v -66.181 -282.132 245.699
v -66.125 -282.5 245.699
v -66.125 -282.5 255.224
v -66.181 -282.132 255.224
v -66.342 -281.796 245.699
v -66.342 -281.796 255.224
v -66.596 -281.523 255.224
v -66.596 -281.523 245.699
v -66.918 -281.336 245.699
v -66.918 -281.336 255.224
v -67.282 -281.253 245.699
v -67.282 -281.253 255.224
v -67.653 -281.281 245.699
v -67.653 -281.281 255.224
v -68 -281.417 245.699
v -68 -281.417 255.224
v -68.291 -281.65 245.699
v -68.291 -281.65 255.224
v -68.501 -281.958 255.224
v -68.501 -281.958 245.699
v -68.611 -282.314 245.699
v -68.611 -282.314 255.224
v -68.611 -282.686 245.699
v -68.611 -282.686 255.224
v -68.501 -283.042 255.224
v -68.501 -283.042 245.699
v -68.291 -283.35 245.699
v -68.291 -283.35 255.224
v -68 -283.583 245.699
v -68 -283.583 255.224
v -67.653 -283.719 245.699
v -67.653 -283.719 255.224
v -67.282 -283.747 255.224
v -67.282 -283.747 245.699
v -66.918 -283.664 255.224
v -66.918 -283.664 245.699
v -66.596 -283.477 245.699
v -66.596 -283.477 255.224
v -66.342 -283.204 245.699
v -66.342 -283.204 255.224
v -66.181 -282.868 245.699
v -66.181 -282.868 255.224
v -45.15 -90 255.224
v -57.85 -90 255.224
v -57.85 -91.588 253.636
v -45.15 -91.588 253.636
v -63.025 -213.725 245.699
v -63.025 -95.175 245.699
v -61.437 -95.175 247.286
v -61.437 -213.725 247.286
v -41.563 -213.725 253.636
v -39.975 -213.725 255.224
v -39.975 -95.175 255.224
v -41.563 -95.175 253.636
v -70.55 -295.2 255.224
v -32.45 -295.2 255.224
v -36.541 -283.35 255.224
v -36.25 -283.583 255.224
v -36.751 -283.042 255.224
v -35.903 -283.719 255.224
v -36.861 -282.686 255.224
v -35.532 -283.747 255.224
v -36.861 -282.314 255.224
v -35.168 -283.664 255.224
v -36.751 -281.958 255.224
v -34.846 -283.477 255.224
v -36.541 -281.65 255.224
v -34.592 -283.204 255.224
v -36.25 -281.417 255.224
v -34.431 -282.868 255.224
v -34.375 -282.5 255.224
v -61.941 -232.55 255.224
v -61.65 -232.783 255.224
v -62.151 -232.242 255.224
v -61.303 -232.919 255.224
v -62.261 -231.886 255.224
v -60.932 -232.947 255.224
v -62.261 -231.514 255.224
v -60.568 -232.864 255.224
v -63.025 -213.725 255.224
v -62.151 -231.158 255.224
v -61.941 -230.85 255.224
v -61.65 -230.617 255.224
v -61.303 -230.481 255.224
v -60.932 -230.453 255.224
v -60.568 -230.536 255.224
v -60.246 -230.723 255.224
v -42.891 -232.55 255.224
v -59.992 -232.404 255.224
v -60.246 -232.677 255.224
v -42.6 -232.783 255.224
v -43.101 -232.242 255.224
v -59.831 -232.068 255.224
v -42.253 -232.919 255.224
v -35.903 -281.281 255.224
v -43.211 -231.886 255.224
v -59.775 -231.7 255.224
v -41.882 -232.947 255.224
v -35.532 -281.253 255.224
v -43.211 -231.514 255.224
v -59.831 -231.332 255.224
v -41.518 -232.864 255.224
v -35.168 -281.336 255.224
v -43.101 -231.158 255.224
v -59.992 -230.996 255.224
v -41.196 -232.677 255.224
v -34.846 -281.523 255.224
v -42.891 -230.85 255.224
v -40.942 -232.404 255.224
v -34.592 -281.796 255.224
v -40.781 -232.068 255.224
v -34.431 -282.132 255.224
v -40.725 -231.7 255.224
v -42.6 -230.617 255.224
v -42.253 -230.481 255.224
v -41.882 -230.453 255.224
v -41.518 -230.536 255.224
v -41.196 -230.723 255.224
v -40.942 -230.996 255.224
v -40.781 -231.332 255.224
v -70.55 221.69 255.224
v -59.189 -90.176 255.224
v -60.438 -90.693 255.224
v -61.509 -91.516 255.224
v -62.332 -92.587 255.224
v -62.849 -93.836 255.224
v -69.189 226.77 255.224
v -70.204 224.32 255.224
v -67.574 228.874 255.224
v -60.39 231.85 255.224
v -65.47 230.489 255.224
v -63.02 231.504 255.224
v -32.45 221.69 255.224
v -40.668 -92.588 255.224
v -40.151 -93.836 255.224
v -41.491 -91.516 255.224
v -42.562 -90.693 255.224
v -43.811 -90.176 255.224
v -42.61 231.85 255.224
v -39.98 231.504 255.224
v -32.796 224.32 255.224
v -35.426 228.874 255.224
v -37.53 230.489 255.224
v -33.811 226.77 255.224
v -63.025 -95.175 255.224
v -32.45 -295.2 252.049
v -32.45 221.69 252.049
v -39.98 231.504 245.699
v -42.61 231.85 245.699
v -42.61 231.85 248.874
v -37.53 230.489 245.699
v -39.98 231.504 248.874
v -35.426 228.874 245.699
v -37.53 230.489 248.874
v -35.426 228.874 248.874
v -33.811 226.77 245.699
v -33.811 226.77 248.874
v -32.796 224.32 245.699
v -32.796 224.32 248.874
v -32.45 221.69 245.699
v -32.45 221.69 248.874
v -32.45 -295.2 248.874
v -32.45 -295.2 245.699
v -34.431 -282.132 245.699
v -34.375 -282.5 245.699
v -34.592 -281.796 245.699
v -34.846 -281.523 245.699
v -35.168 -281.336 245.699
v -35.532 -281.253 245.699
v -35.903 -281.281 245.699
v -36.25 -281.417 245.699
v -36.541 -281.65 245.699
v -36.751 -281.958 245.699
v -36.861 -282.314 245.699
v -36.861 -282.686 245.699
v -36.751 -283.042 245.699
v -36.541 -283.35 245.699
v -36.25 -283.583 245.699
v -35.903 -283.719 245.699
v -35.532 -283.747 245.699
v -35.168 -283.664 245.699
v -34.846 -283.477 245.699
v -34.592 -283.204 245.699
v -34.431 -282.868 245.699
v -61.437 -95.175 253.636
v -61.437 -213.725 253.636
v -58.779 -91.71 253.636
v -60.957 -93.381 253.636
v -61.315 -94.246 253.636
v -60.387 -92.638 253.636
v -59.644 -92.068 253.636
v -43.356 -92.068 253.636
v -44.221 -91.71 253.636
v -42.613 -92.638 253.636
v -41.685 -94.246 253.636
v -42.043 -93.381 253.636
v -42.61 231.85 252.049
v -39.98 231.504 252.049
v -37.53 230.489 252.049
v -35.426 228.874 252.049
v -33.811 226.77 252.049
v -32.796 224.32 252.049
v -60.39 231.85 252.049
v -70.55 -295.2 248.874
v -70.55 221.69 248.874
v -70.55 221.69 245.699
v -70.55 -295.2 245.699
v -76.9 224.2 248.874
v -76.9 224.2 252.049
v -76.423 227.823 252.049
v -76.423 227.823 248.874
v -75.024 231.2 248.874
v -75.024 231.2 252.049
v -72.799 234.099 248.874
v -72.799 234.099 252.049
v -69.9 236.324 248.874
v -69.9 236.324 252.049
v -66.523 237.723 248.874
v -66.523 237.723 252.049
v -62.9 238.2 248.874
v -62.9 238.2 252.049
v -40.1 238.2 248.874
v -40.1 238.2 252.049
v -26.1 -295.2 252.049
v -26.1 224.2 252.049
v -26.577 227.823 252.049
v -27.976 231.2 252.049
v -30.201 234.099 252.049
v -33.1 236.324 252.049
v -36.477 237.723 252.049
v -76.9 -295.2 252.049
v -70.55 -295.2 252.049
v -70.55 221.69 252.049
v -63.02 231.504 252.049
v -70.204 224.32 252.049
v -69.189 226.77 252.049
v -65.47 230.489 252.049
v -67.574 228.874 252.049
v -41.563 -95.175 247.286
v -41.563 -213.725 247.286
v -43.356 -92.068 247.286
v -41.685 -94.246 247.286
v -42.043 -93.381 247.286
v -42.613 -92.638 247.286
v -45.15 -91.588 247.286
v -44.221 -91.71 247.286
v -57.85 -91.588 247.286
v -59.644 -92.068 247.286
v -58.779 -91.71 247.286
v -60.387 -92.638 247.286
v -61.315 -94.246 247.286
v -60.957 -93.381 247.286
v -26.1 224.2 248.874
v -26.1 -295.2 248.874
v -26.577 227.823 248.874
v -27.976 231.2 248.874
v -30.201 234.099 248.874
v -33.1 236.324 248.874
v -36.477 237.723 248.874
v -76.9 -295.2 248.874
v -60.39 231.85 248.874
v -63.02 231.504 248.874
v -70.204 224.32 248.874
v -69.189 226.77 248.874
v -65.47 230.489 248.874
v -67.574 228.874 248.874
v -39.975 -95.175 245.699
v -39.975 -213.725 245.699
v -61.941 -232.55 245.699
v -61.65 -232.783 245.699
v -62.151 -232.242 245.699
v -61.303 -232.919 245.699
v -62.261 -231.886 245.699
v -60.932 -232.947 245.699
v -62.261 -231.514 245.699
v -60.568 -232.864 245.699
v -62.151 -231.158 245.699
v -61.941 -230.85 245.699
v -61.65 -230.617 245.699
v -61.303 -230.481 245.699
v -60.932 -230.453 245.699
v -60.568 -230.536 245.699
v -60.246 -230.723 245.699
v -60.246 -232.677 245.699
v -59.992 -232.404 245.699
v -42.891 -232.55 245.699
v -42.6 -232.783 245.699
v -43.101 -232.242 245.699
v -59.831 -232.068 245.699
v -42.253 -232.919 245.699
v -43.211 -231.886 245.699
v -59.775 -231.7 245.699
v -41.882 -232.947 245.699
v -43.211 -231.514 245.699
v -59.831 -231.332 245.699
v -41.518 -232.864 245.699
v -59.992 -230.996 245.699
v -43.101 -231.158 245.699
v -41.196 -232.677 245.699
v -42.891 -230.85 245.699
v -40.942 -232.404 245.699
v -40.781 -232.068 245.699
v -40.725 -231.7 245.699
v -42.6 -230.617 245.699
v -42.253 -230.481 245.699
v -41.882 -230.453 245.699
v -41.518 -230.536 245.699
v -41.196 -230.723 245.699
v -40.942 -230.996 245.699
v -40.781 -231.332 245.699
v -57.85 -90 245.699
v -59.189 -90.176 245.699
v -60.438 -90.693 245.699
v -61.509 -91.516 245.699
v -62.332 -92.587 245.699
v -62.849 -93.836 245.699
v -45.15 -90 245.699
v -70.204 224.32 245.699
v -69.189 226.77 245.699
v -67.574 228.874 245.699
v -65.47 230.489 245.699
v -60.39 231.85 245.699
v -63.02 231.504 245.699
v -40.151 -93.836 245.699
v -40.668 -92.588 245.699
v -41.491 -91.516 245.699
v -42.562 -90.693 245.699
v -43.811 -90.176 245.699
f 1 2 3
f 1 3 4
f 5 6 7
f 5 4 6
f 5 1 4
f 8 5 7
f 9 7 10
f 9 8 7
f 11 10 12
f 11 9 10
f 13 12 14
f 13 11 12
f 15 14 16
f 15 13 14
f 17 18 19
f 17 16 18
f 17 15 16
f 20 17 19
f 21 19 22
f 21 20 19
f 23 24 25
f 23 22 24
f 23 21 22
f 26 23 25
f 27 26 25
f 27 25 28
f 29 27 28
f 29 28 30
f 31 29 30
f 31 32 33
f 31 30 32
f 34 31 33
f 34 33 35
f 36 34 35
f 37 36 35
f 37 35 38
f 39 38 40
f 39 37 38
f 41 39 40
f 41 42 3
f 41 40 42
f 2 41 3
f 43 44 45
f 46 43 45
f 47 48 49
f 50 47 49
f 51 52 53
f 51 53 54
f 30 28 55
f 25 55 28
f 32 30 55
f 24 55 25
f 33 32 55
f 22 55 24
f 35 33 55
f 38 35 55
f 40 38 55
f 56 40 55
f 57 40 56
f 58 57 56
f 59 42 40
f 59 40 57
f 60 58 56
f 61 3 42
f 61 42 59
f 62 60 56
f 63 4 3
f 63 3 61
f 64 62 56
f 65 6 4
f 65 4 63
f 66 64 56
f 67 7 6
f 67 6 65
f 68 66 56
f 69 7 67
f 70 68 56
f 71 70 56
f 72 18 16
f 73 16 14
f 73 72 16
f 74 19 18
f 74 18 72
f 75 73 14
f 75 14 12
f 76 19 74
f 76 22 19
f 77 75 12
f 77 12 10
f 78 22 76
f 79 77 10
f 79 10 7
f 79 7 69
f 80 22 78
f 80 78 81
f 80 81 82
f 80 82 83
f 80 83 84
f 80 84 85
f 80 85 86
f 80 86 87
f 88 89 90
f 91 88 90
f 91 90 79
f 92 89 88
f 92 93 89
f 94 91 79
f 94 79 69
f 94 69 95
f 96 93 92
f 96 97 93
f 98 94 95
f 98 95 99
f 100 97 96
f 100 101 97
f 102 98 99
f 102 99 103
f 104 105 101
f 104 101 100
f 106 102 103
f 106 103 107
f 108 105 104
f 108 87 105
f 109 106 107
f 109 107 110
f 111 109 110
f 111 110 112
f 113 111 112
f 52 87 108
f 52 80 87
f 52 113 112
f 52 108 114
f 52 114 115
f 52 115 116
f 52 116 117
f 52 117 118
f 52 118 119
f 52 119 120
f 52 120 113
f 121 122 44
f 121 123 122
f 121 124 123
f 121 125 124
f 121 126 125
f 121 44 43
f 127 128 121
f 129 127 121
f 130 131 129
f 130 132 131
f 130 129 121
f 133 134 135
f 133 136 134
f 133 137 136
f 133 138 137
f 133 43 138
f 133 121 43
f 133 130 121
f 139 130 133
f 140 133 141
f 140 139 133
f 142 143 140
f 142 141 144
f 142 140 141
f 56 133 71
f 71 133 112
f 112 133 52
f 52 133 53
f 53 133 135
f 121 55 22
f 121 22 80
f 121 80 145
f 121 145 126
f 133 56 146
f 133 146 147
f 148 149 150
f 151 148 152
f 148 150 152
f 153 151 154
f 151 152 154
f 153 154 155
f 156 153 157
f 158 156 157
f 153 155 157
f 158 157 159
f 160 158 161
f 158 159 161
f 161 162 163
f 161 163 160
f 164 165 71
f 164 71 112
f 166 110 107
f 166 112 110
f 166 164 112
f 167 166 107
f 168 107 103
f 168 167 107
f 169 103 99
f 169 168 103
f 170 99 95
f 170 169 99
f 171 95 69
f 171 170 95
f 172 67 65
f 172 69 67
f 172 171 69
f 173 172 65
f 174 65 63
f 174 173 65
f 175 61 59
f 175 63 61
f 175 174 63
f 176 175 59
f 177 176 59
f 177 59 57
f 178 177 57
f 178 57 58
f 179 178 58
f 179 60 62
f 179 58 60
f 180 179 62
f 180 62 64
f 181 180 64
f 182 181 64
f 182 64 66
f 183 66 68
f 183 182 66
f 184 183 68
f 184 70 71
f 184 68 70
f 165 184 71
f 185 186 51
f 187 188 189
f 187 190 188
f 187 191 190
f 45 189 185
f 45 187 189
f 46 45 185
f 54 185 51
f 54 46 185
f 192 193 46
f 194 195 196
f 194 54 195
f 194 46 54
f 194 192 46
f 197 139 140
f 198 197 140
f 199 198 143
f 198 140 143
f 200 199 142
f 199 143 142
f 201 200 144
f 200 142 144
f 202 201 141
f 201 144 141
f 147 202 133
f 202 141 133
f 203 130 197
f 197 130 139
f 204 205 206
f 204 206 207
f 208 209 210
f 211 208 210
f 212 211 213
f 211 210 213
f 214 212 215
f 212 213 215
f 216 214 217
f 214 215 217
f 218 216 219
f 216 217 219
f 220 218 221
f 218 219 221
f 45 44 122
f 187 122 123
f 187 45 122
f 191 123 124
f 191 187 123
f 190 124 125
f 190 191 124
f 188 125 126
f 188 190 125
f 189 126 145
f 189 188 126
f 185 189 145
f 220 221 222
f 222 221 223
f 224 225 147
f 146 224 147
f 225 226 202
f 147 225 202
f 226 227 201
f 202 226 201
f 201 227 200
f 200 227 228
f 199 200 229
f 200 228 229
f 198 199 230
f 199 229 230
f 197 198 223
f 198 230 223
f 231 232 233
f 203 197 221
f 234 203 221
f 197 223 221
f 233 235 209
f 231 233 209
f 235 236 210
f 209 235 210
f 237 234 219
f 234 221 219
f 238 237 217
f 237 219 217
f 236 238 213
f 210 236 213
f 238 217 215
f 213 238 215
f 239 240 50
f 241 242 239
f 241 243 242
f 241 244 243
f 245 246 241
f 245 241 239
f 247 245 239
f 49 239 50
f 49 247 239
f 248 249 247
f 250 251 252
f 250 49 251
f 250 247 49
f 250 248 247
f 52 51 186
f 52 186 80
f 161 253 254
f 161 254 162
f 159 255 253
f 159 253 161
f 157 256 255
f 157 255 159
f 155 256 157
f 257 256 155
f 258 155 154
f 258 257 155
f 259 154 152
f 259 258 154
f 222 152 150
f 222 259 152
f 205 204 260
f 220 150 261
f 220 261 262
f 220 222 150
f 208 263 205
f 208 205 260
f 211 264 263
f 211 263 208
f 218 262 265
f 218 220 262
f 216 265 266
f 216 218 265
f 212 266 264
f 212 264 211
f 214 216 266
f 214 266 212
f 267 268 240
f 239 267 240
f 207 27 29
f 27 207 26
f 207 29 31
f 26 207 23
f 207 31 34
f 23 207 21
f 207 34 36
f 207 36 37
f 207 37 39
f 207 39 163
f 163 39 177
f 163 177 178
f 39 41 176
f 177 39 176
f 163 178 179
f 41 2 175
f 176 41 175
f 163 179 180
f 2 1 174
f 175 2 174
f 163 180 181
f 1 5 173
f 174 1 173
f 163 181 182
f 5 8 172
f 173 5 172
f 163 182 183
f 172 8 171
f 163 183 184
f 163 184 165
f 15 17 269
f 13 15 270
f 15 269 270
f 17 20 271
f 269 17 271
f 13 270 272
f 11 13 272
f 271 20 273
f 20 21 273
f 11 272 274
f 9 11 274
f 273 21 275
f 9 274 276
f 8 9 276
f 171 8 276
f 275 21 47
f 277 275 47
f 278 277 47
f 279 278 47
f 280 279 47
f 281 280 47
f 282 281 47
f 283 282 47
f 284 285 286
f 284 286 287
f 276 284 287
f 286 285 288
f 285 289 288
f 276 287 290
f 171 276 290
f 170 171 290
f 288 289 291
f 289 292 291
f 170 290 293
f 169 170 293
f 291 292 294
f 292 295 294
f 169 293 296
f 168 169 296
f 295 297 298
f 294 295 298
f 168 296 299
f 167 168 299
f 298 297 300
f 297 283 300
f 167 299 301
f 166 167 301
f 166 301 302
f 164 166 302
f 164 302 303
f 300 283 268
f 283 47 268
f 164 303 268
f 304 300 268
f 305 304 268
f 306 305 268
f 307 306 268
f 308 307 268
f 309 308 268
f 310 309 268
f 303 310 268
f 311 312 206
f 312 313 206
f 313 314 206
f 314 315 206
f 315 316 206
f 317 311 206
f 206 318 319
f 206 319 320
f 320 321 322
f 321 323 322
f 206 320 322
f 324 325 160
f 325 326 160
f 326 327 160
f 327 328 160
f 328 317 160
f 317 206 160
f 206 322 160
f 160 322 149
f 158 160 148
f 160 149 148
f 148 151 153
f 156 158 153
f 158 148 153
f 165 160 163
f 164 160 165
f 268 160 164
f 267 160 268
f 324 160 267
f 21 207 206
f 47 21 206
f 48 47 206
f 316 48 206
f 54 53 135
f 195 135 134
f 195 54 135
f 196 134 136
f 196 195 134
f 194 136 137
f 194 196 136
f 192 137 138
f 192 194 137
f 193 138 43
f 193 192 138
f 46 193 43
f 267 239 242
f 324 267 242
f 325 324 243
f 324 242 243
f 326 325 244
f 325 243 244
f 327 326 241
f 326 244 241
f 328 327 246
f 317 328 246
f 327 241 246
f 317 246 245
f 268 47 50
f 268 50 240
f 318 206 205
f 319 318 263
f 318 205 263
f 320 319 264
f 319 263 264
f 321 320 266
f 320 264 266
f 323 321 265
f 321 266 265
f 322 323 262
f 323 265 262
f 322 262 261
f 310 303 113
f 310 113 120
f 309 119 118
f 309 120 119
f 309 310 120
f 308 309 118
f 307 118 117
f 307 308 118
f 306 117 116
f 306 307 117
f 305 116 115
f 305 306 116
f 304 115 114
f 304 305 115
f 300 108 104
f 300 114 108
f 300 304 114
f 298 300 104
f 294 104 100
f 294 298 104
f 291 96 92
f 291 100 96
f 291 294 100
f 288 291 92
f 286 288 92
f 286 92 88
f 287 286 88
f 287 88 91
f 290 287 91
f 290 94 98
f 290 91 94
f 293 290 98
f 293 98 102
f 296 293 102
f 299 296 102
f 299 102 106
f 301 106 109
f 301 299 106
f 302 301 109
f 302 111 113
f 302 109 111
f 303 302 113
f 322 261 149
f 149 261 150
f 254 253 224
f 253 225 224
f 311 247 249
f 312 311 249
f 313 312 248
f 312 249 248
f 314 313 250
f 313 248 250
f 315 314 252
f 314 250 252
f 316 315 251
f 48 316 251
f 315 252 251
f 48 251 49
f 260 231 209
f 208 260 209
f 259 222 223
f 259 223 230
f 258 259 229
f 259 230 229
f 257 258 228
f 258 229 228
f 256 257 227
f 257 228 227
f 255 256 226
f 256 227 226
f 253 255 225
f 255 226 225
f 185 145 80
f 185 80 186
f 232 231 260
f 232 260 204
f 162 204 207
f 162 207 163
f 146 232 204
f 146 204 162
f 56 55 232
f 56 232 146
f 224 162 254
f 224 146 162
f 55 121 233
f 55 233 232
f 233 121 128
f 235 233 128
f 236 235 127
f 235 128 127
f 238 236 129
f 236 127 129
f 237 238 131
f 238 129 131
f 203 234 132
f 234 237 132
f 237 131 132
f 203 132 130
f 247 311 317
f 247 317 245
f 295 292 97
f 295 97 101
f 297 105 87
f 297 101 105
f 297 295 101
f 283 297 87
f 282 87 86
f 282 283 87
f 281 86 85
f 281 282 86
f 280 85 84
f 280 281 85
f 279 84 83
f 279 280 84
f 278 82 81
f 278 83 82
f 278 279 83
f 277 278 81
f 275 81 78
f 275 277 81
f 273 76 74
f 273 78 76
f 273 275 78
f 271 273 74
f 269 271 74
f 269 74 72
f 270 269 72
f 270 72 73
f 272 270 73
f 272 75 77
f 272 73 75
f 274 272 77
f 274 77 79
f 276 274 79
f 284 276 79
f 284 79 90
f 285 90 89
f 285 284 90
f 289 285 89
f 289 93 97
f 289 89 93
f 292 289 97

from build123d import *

# Parameters (mm, degrees)
BOSS_EXTRUDE2_DEPTH     = 1.5875
SKETCH2_W               = 38.1
SKETCH2_H               = 76.2
BOSS_EXTRUDE3_DEPTH     = 4.7625
CUT_EXTRUDE1_DEPTH      = 1.5875
CHAMFER1_SIZE           = 2
CUT_EXTRUDE2_DEPTH      = 306.117964892
CUT_EXTRUDE2_DEPTH_BACK = 306.117964892
SKETCH4_R               = 1.25


with BuildPart() as part:
    # Sketch1 → Boss-Extrude2 (new, symmetric)
    with BuildSketch(Plane.XY.offset(250.46101)):
        with BuildLine():
            Line((-62.9, 238.2), (-40.1, 238.2))
            ThreePointArc((-40.1, 238.2), (-30.200505063, 234.099494937), (-26.1, 224.2))
            Line((-26.1, 224.2), (-26.1, -219))
            Line((-26.1, -219), (-26.1, -295.2))
            Line((-26.1, -295.2), (-76.9, -295.2))
            Line((-76.9, -295.2), (-76.9, -219))
            Line((-76.9, -219), (-76.9, 224.2))
            ThreePointArc((-76.9, 224.2), (-72.799494937, 234.099494937), (-62.9, 238.2))
        make_face()
    extrude(amount=BOSS_EXTRUDE2_DEPTH, both=True)

    # Sketch2 → Boss-Extrude3 (add, symmetric)
    with BuildSketch(Plane.XY.offset(250.46101)):
        with Locations((-51.5, -257.1)):
            Rectangle(SKETCH2_W, SKETCH2_H)
        with BuildLine():
            Line((-60.39, 231.85), (-42.61, 231.85))
            ThreePointArc((-42.61, 231.85), (-35.425795103, 228.874204897), (-32.45, 221.69))
            Line((-32.45, 221.69), (-32.45, -219))
            Line((-32.45, -219), (-70.55, -219))
            Line((-70.55, -219), (-70.55, 221.69))
            ThreePointArc((-70.55, 221.69), (-67.574204897, 228.874204897), (-60.39, 231.85))
        make_face()
    extrude(amount=BOSS_EXTRUDE3_DEPTH, both=True)

    # Sketch3 → Cut-Extrude1 (cut)
    with BuildSketch(Plane.XY.offset(255.22351)):
        with BuildLine():
            Line((-61.025, -95.175), (-61.025, -213.725))
            Line((-61.025, -213.725), (-41.975, -213.725))
            Line((-41.975, -213.725), (-41.975, -95.175))
            ThreePointArc((-41.975, -95.175), (-42.90493597, -92.92993597), (-45.15, -92))
            Line((-45.15, -92), (-57.85, -92))
            ThreePointArc((-57.85, -92), (-60.09506403, -92.92993597), (-61.025, -95.175))
        make_face()
    cut_extrude1 = extrude(amount=-CUT_EXTRUDE1_DEPTH, mode=Mode.SUBTRACT)

    # Mirror2: Cut-Extrude1 across plane
    add(cut_extrude1.mirror(Plane.XY.offset(250.46101)), mode=Mode.SUBTRACT)

    # Chamfer1
    # the kernel refuses this chamfer: 2 mm, written as the material it takes off along each edge
    with BuildSketch(Plane(origin=(-41.975, -213.725, 255.22351), x_dir=(0.999621916911297, 0, 0.0274958766105822), z_dir=(0, 1, 0))) as chamfer1_piece_1_section:
        Polygon((CHAMFER1_SIZE * 0.999621916911, CHAMFER1_SIZE * 0.0274958766106), (-CHAMFER1_SIZE * 0.0274958766106, CHAMFER1_SIZE * 0.999621916911), (0, 0), align=None)
    chamfer1_piece_1 = extrude(amount=118.55, mode=Mode.PRIVATE)
    chamfer1_piece_1 = split(chamfer1_piece_1, bisect_by=Plane(origin=(-41.282092609, -154.45, 253.63601), z_dir=(0, 0, 1)), keep=Keep.TOP, mode=Mode.PRIVATE)
    add(chamfer1_piece_1, mode=Mode.SUBTRACT)
    with BuildSketch(Plane(origin=(-61.025, -95.175, 255.22351), x_dir=(-0.999621916911297, 0, 0.0274958766105822), z_dir=(0, -1, 0))) as chamfer1_piece_2_section:
        Polygon((CHAMFER1_SIZE * 0.999621916911, CHAMFER1_SIZE * 0.0274958766106), (-CHAMFER1_SIZE * 0.0274958766106, CHAMFER1_SIZE * 0.999621916911), (0, 0), align=None)
    chamfer1_piece_2 = extrude(amount=118.55, mode=Mode.PRIVATE)
    chamfer1_piece_2 = split(chamfer1_piece_2, bisect_by=Plane(origin=(-61.717907391, -154.45, 253.63601), z_dir=(0, 0, 1)), keep=Keep.TOP, mode=Mode.PRIVATE)
    add(chamfer1_piece_2, mode=Mode.SUBTRACT)
    with BuildSketch(Plane(origin=(-45.15, -95.175, 255.22351), x_dir=(1, 0, 0), z_dir=(0, -1, 0))) as chamfer1_piece_3_section:
        Polygon((3.175 + CHAMFER1_SIZE, 0), (3.175, -CHAMFER1_SIZE), (3.175, 0), align=None)
    chamfer1_piece_3 = revolve(axis=Axis((-45.15, -95.175, 255.22351), (0, 0, 1)), revolution_arc=90, mode=Mode.PRIVATE)
    chamfer1_piece_3 = split(chamfer1_piece_3, bisect_by=Plane(origin=(-42.646845167, -92.671845167, 253.63601), z_dir=(0, 0, 1)), keep=Keep.TOP, mode=Mode.PRIVATE)
    add(chamfer1_piece_3, mode=Mode.SUBTRACT)
    with BuildSketch(Plane(origin=(-57.85, -95.175, 255.22351), x_dir=(0, 1, 0), z_dir=(1, 0, 0))) as chamfer1_piece_4_section:
        Polygon((3.175 + CHAMFER1_SIZE, 0), (3.175, -CHAMFER1_SIZE), (3.175, 0), align=None)
    chamfer1_piece_4 = revolve(axis=Axis((-57.85, -95.175, 255.22351), (0, 0, 1)), revolution_arc=90, mode=Mode.PRIVATE)
    chamfer1_piece_4 = split(chamfer1_piece_4, bisect_by=Plane(origin=(-60.353154832, -92.671845168, 253.63601), z_dir=(0, 0, 1)), keep=Keep.TOP, mode=Mode.PRIVATE)
    add(chamfer1_piece_4, mode=Mode.SUBTRACT)
    with BuildSketch(Plane(origin=(-45.15, -92, 255.22351), x_dir=(0, 0.999621916911297, 0.027495876610582105), z_dir=(-1, 0, 0))) as chamfer1_piece_5_section:
        Polygon((CHAMFER1_SIZE * 0.999621916911, CHAMFER1_SIZE * 0.0274958766106), (-CHAMFER1_SIZE * 0.0274958766106, CHAMFER1_SIZE * 0.999621916911), (0, 0), align=None)
    chamfer1_piece_5 = extrude(amount=12.7, mode=Mode.PRIVATE)
    chamfer1_piece_5 = split(chamfer1_piece_5, bisect_by=Plane(origin=(-51.5, -91.307092609, 253.63601), z_dir=(0, 0, 1)), keep=Keep.TOP, mode=Mode.PRIVATE)
    add(chamfer1_piece_5, mode=Mode.SUBTRACT)
    with BuildSketch(Plane(origin=(-41.975, -213.725, 245.69851), x_dir=(0.999621916911297, 0, -0.0274958766105822), z_dir=(0, 1, 0))) as chamfer1_piece_6_section:
        Polygon((CHAMFER1_SIZE * 0.999621916911, -CHAMFER1_SIZE * 0.0274958766106), (-CHAMFER1_SIZE * 0.0274958766106, -CHAMFER1_SIZE * 0.999621916911), (0, 0), align=None)
    chamfer1_piece_6 = extrude(amount=118.55, mode=Mode.PRIVATE)
    chamfer1_piece_6 = split(chamfer1_piece_6, bisect_by=Plane(origin=(-41.282092609, -154.45, 247.28601), z_dir=(0, 0, -1)), keep=Keep.TOP, mode=Mode.PRIVATE)
    add(chamfer1_piece_6, mode=Mode.SUBTRACT)
    with BuildSketch(Plane(origin=(-61.025, -95.175, 245.69851), x_dir=(-0.999621916911297, 0, -0.0274958766105822), z_dir=(0, -1, 0))) as chamfer1_piece_7_section:
        Polygon((CHAMFER1_SIZE * 0.999621916911, -CHAMFER1_SIZE * 0.0274958766106), (-CHAMFER1_SIZE * 0.0274958766106, -CHAMFER1_SIZE * 0.999621916911), (0, 0), align=None)
    chamfer1_piece_7 = extrude(amount=118.55, mode=Mode.PRIVATE)
    chamfer1_piece_7 = split(chamfer1_piece_7, bisect_by=Plane(origin=(-61.717907391, -154.45, 247.28601), z_dir=(0, 0, -1)), keep=Keep.TOP, mode=Mode.PRIVATE)
    add(chamfer1_piece_7, mode=Mode.SUBTRACT)
    with BuildSketch(Plane(origin=(-45.15, -95.175, 245.69851), x_dir=(1, 0, 0), z_dir=(0, -1, 0))) as chamfer1_piece_8_section:
        Polygon((3.175 + CHAMFER1_SIZE, 0), (3.175, CHAMFER1_SIZE), (3.175, 0), align=None)
    chamfer1_piece_8 = revolve(axis=Axis((-45.15, -95.175, 245.69851), (0, 0, 1)), revolution_arc=90, mode=Mode.PRIVATE)
    chamfer1_piece_8 = split(chamfer1_piece_8, bisect_by=Plane(origin=(-42.646845167, -92.671845167, 247.28601), z_dir=(0, 0, -1)), keep=Keep.TOP, mode=Mode.PRIVATE)
    add(chamfer1_piece_8, mode=Mode.SUBTRACT)
    with BuildSketch(Plane(origin=(-57.85, -95.175, 245.69851), x_dir=(0, 1, 0), z_dir=(1, 0, 0))) as chamfer1_piece_9_section:
        Polygon((3.175 + CHAMFER1_SIZE, 0), (3.175, CHAMFER1_SIZE), (3.175, 0), align=None)
    chamfer1_piece_9 = revolve(axis=Axis((-57.85, -95.175, 245.69851), (0, 0, 1)), revolution_arc=90, mode=Mode.PRIVATE)
    chamfer1_piece_9 = split(chamfer1_piece_9, bisect_by=Plane(origin=(-60.353154832, -92.671845168, 247.28601), z_dir=(0, 0, -1)), keep=Keep.TOP, mode=Mode.PRIVATE)
    add(chamfer1_piece_9, mode=Mode.SUBTRACT)
    with BuildSketch(Plane(origin=(-45.15, -92, 245.69851), x_dir=(0, 0.999621916911297, -0.027495876610582105), z_dir=(-1, 0, 0))) as chamfer1_piece_10_section:
        Polygon((CHAMFER1_SIZE * 0.999621916911, -CHAMFER1_SIZE * 0.0274958766106), (-CHAMFER1_SIZE * 0.0274958766106, -CHAMFER1_SIZE * 0.999621916911), (0, 0), align=None)
    chamfer1_piece_10 = extrude(amount=12.7, mode=Mode.PRIVATE)
    chamfer1_piece_10 = split(chamfer1_piece_10, bisect_by=Plane(origin=(-51.5, -91.307092609, 247.28601), z_dir=(0, 0, -1)), keep=Keep.TOP, mode=Mode.PRIVATE)
    add(chamfer1_piece_10, mode=Mode.SUBTRACT)

    # Sketch4 → Cut-Extrude2 (cut, two sides: drawn at the far end of the back side and taken through both)
    with BuildSketch(Plane.XY.offset(252.04851).offset(-CUT_EXTRUDE2_DEPTH_BACK)):
        with Locations((-61.025, -231.7)):
            Circle(SKETCH4_R)
        with Locations((-41.975, -231.7)):
            Circle(SKETCH4_R)
        with Locations((-35.625, -282.5)):
            Circle(SKETCH4_R)
        with Locations((-67.375, -282.5)):
            Circle(SKETCH4_R)
    extrude(amount=CUT_EXTRUDE2_DEPTH + CUT_EXTRUDE2_DEPTH_BACK, mode=Mode.SUBTRACT)


solid = part.part
